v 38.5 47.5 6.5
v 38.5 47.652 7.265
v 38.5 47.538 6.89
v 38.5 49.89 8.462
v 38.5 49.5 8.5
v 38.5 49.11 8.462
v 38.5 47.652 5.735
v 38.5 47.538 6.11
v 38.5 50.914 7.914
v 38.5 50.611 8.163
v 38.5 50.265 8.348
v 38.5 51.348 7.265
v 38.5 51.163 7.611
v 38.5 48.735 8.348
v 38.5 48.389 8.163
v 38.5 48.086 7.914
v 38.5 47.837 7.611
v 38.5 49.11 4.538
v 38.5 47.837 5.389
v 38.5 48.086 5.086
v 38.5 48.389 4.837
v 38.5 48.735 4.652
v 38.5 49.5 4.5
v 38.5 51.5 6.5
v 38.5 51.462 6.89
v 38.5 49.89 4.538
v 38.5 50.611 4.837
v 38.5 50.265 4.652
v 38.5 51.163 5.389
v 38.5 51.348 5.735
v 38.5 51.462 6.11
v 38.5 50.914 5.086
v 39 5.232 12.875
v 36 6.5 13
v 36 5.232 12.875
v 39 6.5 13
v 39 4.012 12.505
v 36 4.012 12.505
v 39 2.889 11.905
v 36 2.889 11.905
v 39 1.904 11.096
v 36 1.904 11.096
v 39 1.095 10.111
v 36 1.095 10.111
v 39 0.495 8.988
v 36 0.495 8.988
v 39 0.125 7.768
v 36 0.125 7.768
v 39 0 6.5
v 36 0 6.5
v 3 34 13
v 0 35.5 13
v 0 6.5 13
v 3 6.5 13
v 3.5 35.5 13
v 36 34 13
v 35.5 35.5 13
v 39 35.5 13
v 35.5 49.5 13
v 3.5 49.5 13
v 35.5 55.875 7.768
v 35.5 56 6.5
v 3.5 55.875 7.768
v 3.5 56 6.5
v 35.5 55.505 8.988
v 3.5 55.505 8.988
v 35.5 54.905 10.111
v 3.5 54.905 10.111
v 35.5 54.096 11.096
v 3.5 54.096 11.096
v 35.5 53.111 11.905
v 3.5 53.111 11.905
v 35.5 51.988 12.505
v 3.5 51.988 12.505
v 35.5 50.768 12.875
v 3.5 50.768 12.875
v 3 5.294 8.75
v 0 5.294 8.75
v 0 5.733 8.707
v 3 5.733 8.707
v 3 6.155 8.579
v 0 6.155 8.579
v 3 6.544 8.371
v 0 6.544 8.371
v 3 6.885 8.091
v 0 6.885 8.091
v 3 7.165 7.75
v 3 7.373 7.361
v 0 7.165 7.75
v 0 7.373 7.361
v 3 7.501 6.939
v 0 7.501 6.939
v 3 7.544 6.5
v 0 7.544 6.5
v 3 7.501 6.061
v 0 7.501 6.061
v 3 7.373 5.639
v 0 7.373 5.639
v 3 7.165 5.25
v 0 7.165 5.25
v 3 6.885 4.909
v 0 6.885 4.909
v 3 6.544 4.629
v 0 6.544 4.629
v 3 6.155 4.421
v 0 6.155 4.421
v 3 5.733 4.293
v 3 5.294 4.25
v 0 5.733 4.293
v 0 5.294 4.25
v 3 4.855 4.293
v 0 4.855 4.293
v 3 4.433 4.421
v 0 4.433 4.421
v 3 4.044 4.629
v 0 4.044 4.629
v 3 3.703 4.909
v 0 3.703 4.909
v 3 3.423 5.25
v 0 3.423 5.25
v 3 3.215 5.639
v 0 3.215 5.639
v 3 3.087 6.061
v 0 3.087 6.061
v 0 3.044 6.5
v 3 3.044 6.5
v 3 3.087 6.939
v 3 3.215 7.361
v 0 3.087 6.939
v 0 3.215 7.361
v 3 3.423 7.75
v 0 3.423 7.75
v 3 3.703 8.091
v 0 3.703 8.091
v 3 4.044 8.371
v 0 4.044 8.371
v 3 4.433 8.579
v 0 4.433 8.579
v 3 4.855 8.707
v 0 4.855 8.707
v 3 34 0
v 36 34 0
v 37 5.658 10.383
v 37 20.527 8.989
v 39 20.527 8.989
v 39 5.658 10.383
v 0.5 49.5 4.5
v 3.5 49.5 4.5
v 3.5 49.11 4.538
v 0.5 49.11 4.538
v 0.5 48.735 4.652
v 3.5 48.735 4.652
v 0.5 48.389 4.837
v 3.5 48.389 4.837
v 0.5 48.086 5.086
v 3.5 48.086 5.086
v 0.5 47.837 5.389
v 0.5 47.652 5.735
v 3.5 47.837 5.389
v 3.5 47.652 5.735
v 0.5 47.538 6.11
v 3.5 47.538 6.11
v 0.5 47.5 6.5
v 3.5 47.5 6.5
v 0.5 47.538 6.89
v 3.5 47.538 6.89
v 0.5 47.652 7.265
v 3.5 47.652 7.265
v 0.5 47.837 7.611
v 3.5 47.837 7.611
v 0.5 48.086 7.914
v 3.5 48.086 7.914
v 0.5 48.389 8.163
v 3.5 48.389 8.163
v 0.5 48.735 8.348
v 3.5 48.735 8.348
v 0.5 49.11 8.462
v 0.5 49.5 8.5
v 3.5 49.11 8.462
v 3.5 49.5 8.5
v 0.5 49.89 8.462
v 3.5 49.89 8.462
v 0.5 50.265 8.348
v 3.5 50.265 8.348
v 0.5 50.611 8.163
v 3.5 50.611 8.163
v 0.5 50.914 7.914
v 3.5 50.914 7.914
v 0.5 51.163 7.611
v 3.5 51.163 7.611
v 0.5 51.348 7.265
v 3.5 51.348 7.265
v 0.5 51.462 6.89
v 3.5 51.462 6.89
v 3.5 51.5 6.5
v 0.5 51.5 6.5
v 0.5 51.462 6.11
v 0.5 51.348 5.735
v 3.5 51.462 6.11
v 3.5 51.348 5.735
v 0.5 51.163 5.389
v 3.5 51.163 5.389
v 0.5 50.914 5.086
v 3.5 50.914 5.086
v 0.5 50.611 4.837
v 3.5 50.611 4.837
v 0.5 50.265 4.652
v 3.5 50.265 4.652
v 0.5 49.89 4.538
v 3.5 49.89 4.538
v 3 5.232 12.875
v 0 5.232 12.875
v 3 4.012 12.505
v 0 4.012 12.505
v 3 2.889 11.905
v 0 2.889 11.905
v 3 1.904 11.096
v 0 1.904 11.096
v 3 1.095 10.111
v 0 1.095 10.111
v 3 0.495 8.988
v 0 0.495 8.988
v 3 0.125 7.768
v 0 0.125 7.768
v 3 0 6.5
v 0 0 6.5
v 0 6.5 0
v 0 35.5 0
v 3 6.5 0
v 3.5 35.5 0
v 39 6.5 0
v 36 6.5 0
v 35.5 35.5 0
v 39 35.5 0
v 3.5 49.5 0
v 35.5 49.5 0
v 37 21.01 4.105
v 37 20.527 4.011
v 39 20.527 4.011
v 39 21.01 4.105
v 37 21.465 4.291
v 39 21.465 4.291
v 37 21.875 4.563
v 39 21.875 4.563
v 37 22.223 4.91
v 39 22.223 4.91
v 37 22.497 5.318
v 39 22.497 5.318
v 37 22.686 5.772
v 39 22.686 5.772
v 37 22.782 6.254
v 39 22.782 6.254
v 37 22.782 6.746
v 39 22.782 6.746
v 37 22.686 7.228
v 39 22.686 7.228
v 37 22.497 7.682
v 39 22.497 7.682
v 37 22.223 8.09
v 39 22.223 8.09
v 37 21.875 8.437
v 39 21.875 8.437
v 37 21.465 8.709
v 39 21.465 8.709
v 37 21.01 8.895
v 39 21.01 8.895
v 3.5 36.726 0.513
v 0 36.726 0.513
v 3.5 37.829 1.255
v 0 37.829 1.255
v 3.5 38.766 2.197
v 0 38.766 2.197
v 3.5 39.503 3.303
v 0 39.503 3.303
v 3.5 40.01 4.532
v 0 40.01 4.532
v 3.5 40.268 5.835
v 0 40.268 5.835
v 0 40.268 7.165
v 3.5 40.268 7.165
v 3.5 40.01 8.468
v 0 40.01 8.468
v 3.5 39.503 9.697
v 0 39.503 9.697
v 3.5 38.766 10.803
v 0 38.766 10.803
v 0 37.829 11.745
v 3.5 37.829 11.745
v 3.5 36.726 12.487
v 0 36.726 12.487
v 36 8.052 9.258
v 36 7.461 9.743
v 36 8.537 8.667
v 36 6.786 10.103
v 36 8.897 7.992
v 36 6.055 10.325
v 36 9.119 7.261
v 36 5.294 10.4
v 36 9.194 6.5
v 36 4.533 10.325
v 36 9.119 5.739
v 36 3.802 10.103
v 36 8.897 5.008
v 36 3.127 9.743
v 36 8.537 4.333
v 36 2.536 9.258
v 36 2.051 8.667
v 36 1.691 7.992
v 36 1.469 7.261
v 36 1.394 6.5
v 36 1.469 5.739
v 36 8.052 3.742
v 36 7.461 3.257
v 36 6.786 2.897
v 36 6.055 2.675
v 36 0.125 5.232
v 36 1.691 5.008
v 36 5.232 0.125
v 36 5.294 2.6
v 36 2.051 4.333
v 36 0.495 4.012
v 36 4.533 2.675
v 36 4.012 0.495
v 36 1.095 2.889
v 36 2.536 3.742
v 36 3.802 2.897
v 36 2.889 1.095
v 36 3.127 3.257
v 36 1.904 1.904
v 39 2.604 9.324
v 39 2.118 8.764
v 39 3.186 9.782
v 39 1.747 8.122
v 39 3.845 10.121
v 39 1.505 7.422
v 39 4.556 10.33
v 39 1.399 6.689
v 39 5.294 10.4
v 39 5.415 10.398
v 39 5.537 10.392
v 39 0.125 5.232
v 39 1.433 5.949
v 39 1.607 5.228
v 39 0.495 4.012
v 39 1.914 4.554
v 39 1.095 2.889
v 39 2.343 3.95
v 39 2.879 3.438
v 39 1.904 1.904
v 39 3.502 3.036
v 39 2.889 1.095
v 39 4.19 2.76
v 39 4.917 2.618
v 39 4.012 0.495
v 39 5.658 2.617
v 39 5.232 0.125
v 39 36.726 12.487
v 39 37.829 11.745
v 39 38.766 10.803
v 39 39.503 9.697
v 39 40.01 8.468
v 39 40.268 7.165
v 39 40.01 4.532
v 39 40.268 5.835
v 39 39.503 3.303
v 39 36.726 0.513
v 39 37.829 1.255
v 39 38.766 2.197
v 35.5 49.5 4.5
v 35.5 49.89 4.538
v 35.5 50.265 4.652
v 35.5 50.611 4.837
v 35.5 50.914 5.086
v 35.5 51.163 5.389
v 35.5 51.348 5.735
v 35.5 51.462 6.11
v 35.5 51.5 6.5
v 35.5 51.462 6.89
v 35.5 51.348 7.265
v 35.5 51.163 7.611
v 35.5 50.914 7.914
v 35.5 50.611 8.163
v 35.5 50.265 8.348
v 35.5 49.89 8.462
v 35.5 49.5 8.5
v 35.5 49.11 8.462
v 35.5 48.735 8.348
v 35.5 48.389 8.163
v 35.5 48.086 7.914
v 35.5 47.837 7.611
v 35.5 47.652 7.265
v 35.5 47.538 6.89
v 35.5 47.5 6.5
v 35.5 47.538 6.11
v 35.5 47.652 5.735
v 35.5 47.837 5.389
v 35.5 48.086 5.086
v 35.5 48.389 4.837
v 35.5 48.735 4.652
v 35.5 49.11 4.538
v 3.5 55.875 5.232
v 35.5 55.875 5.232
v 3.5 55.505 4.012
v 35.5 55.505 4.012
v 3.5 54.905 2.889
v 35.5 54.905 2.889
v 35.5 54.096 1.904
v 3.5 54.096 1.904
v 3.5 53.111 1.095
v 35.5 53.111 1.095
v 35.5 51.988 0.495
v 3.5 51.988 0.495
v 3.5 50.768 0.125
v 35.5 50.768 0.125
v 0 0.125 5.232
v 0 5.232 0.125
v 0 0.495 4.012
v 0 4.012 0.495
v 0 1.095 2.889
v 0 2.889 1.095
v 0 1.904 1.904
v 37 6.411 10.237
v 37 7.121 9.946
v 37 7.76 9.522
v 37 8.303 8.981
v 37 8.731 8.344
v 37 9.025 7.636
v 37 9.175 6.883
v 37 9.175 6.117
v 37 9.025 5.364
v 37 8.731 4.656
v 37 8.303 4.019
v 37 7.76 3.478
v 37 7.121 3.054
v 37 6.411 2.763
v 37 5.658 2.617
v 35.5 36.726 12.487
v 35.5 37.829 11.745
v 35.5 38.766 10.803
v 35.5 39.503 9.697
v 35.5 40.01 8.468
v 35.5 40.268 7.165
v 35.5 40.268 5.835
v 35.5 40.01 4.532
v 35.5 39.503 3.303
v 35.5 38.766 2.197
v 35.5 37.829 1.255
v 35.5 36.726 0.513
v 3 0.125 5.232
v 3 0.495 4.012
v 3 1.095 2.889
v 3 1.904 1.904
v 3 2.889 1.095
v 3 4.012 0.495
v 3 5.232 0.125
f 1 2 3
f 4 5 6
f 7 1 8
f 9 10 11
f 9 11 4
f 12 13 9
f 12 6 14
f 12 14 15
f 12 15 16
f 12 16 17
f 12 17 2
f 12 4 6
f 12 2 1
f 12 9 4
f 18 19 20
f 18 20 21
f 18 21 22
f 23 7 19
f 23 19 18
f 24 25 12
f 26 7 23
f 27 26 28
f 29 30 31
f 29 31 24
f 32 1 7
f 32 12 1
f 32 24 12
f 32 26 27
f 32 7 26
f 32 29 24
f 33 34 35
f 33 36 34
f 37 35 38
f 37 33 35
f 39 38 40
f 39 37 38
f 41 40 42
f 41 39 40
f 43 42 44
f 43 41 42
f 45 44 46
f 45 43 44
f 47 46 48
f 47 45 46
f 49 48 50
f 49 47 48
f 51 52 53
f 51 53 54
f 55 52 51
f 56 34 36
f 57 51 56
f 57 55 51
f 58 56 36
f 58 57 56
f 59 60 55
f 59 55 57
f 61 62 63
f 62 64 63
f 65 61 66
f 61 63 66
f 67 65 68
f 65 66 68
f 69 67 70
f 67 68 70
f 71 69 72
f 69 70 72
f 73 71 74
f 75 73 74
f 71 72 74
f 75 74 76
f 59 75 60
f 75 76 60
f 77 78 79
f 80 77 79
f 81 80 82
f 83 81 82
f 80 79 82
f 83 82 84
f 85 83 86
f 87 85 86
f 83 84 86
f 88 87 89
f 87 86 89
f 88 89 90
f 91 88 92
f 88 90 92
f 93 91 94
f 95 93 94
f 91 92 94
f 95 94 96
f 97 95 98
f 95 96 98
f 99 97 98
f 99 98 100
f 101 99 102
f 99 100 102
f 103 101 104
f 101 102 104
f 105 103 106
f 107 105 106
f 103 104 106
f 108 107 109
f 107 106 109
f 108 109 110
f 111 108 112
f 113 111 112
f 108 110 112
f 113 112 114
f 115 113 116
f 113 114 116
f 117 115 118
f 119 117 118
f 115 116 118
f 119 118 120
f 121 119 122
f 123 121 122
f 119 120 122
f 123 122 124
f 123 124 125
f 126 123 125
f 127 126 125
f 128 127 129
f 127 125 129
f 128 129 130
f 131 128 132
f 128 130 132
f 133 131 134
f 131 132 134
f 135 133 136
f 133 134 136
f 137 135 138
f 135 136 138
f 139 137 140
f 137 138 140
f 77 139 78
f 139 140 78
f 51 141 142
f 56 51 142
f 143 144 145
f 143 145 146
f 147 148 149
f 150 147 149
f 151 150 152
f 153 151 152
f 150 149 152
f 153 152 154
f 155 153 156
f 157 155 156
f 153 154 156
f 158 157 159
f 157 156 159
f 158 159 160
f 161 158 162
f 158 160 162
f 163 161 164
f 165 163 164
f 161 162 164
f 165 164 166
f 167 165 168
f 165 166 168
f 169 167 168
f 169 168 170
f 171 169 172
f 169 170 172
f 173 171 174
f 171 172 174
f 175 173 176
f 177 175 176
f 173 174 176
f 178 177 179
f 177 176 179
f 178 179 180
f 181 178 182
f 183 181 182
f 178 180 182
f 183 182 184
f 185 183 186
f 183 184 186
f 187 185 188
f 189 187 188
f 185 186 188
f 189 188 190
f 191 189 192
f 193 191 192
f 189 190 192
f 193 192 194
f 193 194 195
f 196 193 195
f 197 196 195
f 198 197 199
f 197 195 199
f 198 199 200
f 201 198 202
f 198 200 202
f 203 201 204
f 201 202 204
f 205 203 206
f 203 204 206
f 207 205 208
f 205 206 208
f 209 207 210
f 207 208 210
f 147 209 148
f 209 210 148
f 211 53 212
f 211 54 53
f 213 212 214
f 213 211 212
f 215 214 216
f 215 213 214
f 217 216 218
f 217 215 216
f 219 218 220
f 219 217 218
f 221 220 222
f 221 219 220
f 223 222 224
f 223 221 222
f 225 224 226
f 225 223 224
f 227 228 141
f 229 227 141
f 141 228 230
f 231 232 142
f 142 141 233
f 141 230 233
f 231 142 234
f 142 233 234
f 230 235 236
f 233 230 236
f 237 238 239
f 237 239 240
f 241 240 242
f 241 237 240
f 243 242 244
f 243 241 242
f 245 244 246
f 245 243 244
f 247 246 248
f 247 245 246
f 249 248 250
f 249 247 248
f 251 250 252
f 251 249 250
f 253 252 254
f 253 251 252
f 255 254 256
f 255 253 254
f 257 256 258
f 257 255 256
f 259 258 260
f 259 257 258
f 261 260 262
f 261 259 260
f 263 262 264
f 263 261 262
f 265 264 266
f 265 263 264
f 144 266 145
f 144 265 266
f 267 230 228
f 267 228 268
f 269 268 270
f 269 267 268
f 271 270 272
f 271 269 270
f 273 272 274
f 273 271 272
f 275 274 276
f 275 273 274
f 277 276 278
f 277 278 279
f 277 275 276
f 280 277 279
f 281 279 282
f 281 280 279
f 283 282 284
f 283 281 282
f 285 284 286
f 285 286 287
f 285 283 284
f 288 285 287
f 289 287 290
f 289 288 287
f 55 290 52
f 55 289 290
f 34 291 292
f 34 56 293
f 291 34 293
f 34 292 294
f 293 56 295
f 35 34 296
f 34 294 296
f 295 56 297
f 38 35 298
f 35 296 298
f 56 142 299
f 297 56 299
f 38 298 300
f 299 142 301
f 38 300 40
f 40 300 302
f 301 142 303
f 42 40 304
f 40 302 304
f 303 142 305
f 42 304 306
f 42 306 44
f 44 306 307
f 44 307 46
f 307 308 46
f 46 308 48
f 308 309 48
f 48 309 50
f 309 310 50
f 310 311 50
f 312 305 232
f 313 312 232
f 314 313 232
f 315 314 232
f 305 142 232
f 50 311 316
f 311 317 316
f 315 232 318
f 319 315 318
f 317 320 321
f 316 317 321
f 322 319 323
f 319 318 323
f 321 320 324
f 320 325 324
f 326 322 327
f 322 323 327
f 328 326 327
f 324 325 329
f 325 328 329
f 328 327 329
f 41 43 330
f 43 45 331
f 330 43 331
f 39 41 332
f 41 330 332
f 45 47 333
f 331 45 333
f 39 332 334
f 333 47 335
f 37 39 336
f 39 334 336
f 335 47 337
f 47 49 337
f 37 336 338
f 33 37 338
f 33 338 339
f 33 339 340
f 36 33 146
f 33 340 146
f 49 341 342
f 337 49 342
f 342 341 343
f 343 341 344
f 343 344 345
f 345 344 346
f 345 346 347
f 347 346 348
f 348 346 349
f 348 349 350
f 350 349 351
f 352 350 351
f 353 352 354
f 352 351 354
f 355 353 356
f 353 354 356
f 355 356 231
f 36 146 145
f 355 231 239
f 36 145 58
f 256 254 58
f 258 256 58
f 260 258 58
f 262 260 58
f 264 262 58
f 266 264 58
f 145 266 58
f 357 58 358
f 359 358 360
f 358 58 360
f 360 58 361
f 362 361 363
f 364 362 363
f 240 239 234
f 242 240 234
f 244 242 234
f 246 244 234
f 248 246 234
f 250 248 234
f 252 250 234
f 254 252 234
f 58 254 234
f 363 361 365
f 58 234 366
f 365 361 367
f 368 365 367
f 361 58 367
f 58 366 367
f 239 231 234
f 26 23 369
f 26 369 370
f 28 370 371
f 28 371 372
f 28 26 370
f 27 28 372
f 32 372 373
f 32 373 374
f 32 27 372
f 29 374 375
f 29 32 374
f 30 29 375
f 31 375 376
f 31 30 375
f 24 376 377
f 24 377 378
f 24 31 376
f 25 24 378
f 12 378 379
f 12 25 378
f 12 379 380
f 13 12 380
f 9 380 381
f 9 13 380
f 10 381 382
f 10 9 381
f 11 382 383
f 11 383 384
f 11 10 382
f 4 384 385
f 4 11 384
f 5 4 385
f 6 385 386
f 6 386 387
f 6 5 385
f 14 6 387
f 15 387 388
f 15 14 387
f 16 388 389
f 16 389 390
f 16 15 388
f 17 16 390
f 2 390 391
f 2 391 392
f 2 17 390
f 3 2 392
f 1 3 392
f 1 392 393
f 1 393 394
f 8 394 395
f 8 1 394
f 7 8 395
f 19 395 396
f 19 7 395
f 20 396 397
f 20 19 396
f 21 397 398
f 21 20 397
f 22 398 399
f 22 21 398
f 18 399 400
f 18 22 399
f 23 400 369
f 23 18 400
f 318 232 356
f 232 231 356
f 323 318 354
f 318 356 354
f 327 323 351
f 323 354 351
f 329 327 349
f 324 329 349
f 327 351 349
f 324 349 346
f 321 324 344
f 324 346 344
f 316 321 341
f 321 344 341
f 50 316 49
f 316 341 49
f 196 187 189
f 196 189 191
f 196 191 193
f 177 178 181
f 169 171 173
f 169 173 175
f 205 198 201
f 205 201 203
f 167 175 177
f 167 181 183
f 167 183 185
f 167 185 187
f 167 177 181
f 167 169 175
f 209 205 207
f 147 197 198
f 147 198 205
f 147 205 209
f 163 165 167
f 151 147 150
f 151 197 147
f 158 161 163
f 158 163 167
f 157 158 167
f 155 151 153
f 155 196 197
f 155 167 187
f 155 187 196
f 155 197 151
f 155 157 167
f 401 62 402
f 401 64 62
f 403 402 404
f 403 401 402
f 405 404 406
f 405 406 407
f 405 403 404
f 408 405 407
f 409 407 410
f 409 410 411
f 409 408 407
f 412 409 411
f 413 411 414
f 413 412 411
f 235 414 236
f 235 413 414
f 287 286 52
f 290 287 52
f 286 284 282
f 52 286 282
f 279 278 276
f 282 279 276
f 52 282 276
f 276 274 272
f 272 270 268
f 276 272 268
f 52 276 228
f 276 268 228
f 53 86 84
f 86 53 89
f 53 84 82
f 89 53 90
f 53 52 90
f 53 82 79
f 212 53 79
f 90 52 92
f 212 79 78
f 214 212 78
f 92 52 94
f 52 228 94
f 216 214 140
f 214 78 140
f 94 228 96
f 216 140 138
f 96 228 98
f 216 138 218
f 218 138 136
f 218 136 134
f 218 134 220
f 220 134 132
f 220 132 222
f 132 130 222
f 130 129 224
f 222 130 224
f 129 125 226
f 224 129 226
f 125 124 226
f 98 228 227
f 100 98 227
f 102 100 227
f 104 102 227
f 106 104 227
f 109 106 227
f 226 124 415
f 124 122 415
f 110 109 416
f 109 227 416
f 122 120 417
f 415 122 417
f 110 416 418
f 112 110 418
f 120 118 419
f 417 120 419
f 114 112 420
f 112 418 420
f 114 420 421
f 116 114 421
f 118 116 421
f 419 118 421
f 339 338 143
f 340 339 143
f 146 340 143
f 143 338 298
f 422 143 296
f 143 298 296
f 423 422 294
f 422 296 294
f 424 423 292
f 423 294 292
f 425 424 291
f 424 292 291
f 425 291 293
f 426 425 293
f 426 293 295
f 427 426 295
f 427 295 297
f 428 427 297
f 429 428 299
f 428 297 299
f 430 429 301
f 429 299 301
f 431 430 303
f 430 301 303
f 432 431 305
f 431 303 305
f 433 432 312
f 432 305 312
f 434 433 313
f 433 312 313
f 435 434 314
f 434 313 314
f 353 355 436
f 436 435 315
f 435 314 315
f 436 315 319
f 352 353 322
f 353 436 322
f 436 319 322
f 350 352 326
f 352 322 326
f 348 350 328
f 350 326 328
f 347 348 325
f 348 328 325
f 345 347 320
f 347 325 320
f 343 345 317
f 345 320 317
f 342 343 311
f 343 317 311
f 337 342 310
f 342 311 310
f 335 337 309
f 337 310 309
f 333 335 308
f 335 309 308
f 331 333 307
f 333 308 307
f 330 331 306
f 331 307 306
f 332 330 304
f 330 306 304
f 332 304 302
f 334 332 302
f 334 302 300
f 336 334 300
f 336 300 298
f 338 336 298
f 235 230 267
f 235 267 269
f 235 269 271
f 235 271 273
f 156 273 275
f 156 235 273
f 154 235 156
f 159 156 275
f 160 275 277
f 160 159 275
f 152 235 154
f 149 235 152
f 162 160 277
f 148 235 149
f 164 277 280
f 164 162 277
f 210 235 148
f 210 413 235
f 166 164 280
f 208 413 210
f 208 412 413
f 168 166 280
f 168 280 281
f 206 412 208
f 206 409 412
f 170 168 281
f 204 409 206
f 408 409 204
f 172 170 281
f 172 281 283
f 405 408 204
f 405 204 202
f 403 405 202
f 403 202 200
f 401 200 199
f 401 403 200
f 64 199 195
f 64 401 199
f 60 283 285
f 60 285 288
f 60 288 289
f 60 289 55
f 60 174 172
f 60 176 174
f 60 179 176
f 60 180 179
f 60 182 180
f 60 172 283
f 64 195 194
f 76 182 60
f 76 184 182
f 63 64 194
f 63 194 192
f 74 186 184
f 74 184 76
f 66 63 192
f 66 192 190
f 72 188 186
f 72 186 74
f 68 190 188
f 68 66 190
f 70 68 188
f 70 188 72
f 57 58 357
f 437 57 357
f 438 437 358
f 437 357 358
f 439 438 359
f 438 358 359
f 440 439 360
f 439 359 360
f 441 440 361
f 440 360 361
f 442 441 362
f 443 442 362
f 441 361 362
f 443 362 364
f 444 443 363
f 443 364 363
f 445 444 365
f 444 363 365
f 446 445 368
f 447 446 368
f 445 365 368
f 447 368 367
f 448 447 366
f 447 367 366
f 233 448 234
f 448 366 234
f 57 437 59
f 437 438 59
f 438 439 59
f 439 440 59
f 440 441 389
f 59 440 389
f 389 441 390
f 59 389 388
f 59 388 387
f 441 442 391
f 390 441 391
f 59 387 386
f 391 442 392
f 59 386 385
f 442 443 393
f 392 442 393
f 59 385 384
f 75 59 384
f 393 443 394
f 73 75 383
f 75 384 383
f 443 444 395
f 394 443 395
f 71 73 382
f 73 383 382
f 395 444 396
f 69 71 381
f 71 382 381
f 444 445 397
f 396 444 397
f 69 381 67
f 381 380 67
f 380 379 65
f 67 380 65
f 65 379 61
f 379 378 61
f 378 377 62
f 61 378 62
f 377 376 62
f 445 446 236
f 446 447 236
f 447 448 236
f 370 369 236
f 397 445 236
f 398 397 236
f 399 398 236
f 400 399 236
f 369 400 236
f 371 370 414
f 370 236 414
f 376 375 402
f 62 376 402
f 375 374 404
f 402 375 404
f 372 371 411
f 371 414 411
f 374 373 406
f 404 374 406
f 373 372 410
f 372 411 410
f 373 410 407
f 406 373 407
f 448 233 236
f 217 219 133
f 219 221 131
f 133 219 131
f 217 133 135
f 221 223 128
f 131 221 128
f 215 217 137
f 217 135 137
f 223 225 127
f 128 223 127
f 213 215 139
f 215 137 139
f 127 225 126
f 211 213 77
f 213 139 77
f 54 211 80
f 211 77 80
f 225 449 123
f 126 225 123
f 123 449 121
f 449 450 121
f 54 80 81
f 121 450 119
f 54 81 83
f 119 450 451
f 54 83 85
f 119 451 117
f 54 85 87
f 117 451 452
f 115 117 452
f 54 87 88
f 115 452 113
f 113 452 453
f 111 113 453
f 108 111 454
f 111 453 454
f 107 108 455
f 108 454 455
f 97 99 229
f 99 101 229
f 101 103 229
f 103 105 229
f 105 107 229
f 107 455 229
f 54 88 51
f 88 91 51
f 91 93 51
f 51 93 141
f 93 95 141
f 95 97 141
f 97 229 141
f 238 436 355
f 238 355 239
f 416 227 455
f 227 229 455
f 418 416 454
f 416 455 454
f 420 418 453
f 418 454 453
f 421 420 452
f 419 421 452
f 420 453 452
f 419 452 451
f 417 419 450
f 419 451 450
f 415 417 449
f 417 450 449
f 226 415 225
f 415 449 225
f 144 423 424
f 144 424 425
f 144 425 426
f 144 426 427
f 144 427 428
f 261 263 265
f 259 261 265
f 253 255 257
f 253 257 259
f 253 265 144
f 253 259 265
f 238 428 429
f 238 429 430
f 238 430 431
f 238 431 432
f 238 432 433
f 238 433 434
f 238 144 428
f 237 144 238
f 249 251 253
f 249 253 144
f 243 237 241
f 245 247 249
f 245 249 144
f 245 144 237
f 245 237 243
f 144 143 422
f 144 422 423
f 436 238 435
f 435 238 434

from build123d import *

# Parameters (mm, degrees)
BOSS_EXTRUDE1_DEPTH = 13
SKETCH2_R           = 2.25
CUT_EXTRUDE1_DEPTH  = 3
SKETCH3_R           = 2
BOSS_EXTRUDE2_DEPTH = 3
BOSS_EXTRUDE3_START = 3
SKETCH4_R           = 2
BOSS_EXTRUDE3_DEPTH = 3
CUT_EXTRUDE2_DEPTH  = 3.5
CUT_EXTRUDE3_START  = -3.5
CUT_EXTRUDE3_DEPTH  = 3.5
FILLET1_R           = 6.5
FILLET2_R           = 6.5
SKETCH7_R           = 3.9
CUT_EXTRUDE4_DEPTH  = 68.830671528
CUT_EXTRUDE5_START  = -2
CUT_EXTRUDE5_DEPTH  = 2


with BuildPart() as part:
    # Sketch1 → Boss-Extrude1 (new body)
    with BuildSketch(Plane.XY):
        Polygon((3, 0), (3, 34), (36, 34), (36, 0), (39, 0), (39, 42), (35.5, 42), (35.5, 56), (3.5, 56), (3.5, 42), (0, 42), (0, 0), align=None)
    extrude(amount=BOSS_EXTRUDE1_DEPTH)

    # Sketch2 → Cut-Extrude1 (cut)
    with BuildSketch(Plane.ZY):
        with Locations((6.5, 5.293988539)):
            Circle(SKETCH2_R)
    extrude(amount=-CUT_EXTRUDE1_DEPTH, mode=Mode.SUBTRACT)

    # Sketch3 → Boss-Extrude2 (add)
    with BuildSketch(Plane.ZY.offset(-3.5)):
        with Locations(Location((6.5, 49.5, 0), (0, 0, 180))):
            Circle(SKETCH3_R)
    extrude(amount=BOSS_EXTRUDE2_DEPTH)

    # Sketch4 → Boss-Extrude3 (add)
    with BuildSketch(Plane(origin=(35.5, 0, 0), x_dir=(0, 0, -1), z_dir=(1, 0, 0)).offset(BOSS_EXTRUDE3_START)):
        with Locations((-6.5, 49.5)):
            Circle(SKETCH4_R)
    extrude(amount=-BOSS_EXTRUDE3_DEPTH)

    # Sketch5 → Cut-Extrude2 (cut)
    with BuildSketch(Plane(origin=(39, 0, 0), x_dir=(0, 0, -1), z_dir=(1, 0, 0))):
        with BuildLine():
            Line((0, 35.5), (0, 45))
            Line((0, 45), (-13, 45))
            Line((-13, 45), (-13, 35.5))
            ThreePointArc((-13, 35.5), (-6.5, 40.300735254), (0, 35.5))
        make_face()
    extrude(amount=-CUT_EXTRUDE2_DEPTH, mode=Mode.SUBTRACT)

    # Sketch6 → Cut-Extrude3 (cut)
    with BuildSketch(Plane.ZY.offset(CUT_EXTRUDE3_START)):
        with BuildLine():
            Line((13, 35.5), (13, 45))
            Line((13, 45), (0, 45))
            Line((0, 45), (0, 35.5))
            ThreePointArc((0, 35.5), (6.5, 40.300735254), (13, 35.5))
        make_face()
    extrude(amount=CUT_EXTRUDE3_DEPTH, mode=Mode.SUBTRACT)

    # Fillet1
    fillet1_edges = [part.edges().sort_by_distance(p)[0] for p in [
        (19.5, 56, 13),
        (19.5, 56, 0),
    ]]
    fillet(fillet1_edges, radius=FILLET1_R - 0.0001)  # a hair under: the kernel refuses the full size

    # Fillet2
    fillet2_edges = [part.edges().sort_by_distance(p)[0] for p in [
        (37.5, 0, 13),
        (37.5, 0, 0),
        (1.5, 0, 13),
        (1.5, 0, 0),
    ]]
    fillet(fillet2_edges, radius=FILLET2_R - 0.0001)  # a hair under: the kernel refuses the full size

    # Sketch7 → Cut-Extrude4 (cut, through all)
    with BuildSketch(Plane.ZY.offset(-36)):
        with Locations((6.5, 5.293988539)):
            Circle(SKETCH7_R)
    extrude(amount=-CUT_EXTRUDE4_DEPTH, mode=Mode.SUBTRACT)

    # Sketch8 → Cut-Extrude5 (cut)
    with BuildSketch(Plane(origin=(39, 0, 0), x_dir=(0, 0, -1), z_dir=(1, 0, 0)).offset(CUT_EXTRUDE5_START)):
        with BuildLine():
            Line((-8.989087294, 20.527321872), (-10.382976178, 5.657988539))
            ThreePointArc((-10.382976178, 5.657988539), (-6.5, 1.393988539), (-2.617023822, 5.657988539))
            Line((-2.617023822, 5.657988539), (-4.010912706, 20.527321872))
            ThreePointArc((-4.010912706, 20.527321872), (-6.5, 22.793988539), (-8.989087294, 20.527321872))
        make_face()
    extrude(amount=CUT_EXTRUDE5_DEPTH, mode=Mode.SUBTRACT)


solid = part.part
